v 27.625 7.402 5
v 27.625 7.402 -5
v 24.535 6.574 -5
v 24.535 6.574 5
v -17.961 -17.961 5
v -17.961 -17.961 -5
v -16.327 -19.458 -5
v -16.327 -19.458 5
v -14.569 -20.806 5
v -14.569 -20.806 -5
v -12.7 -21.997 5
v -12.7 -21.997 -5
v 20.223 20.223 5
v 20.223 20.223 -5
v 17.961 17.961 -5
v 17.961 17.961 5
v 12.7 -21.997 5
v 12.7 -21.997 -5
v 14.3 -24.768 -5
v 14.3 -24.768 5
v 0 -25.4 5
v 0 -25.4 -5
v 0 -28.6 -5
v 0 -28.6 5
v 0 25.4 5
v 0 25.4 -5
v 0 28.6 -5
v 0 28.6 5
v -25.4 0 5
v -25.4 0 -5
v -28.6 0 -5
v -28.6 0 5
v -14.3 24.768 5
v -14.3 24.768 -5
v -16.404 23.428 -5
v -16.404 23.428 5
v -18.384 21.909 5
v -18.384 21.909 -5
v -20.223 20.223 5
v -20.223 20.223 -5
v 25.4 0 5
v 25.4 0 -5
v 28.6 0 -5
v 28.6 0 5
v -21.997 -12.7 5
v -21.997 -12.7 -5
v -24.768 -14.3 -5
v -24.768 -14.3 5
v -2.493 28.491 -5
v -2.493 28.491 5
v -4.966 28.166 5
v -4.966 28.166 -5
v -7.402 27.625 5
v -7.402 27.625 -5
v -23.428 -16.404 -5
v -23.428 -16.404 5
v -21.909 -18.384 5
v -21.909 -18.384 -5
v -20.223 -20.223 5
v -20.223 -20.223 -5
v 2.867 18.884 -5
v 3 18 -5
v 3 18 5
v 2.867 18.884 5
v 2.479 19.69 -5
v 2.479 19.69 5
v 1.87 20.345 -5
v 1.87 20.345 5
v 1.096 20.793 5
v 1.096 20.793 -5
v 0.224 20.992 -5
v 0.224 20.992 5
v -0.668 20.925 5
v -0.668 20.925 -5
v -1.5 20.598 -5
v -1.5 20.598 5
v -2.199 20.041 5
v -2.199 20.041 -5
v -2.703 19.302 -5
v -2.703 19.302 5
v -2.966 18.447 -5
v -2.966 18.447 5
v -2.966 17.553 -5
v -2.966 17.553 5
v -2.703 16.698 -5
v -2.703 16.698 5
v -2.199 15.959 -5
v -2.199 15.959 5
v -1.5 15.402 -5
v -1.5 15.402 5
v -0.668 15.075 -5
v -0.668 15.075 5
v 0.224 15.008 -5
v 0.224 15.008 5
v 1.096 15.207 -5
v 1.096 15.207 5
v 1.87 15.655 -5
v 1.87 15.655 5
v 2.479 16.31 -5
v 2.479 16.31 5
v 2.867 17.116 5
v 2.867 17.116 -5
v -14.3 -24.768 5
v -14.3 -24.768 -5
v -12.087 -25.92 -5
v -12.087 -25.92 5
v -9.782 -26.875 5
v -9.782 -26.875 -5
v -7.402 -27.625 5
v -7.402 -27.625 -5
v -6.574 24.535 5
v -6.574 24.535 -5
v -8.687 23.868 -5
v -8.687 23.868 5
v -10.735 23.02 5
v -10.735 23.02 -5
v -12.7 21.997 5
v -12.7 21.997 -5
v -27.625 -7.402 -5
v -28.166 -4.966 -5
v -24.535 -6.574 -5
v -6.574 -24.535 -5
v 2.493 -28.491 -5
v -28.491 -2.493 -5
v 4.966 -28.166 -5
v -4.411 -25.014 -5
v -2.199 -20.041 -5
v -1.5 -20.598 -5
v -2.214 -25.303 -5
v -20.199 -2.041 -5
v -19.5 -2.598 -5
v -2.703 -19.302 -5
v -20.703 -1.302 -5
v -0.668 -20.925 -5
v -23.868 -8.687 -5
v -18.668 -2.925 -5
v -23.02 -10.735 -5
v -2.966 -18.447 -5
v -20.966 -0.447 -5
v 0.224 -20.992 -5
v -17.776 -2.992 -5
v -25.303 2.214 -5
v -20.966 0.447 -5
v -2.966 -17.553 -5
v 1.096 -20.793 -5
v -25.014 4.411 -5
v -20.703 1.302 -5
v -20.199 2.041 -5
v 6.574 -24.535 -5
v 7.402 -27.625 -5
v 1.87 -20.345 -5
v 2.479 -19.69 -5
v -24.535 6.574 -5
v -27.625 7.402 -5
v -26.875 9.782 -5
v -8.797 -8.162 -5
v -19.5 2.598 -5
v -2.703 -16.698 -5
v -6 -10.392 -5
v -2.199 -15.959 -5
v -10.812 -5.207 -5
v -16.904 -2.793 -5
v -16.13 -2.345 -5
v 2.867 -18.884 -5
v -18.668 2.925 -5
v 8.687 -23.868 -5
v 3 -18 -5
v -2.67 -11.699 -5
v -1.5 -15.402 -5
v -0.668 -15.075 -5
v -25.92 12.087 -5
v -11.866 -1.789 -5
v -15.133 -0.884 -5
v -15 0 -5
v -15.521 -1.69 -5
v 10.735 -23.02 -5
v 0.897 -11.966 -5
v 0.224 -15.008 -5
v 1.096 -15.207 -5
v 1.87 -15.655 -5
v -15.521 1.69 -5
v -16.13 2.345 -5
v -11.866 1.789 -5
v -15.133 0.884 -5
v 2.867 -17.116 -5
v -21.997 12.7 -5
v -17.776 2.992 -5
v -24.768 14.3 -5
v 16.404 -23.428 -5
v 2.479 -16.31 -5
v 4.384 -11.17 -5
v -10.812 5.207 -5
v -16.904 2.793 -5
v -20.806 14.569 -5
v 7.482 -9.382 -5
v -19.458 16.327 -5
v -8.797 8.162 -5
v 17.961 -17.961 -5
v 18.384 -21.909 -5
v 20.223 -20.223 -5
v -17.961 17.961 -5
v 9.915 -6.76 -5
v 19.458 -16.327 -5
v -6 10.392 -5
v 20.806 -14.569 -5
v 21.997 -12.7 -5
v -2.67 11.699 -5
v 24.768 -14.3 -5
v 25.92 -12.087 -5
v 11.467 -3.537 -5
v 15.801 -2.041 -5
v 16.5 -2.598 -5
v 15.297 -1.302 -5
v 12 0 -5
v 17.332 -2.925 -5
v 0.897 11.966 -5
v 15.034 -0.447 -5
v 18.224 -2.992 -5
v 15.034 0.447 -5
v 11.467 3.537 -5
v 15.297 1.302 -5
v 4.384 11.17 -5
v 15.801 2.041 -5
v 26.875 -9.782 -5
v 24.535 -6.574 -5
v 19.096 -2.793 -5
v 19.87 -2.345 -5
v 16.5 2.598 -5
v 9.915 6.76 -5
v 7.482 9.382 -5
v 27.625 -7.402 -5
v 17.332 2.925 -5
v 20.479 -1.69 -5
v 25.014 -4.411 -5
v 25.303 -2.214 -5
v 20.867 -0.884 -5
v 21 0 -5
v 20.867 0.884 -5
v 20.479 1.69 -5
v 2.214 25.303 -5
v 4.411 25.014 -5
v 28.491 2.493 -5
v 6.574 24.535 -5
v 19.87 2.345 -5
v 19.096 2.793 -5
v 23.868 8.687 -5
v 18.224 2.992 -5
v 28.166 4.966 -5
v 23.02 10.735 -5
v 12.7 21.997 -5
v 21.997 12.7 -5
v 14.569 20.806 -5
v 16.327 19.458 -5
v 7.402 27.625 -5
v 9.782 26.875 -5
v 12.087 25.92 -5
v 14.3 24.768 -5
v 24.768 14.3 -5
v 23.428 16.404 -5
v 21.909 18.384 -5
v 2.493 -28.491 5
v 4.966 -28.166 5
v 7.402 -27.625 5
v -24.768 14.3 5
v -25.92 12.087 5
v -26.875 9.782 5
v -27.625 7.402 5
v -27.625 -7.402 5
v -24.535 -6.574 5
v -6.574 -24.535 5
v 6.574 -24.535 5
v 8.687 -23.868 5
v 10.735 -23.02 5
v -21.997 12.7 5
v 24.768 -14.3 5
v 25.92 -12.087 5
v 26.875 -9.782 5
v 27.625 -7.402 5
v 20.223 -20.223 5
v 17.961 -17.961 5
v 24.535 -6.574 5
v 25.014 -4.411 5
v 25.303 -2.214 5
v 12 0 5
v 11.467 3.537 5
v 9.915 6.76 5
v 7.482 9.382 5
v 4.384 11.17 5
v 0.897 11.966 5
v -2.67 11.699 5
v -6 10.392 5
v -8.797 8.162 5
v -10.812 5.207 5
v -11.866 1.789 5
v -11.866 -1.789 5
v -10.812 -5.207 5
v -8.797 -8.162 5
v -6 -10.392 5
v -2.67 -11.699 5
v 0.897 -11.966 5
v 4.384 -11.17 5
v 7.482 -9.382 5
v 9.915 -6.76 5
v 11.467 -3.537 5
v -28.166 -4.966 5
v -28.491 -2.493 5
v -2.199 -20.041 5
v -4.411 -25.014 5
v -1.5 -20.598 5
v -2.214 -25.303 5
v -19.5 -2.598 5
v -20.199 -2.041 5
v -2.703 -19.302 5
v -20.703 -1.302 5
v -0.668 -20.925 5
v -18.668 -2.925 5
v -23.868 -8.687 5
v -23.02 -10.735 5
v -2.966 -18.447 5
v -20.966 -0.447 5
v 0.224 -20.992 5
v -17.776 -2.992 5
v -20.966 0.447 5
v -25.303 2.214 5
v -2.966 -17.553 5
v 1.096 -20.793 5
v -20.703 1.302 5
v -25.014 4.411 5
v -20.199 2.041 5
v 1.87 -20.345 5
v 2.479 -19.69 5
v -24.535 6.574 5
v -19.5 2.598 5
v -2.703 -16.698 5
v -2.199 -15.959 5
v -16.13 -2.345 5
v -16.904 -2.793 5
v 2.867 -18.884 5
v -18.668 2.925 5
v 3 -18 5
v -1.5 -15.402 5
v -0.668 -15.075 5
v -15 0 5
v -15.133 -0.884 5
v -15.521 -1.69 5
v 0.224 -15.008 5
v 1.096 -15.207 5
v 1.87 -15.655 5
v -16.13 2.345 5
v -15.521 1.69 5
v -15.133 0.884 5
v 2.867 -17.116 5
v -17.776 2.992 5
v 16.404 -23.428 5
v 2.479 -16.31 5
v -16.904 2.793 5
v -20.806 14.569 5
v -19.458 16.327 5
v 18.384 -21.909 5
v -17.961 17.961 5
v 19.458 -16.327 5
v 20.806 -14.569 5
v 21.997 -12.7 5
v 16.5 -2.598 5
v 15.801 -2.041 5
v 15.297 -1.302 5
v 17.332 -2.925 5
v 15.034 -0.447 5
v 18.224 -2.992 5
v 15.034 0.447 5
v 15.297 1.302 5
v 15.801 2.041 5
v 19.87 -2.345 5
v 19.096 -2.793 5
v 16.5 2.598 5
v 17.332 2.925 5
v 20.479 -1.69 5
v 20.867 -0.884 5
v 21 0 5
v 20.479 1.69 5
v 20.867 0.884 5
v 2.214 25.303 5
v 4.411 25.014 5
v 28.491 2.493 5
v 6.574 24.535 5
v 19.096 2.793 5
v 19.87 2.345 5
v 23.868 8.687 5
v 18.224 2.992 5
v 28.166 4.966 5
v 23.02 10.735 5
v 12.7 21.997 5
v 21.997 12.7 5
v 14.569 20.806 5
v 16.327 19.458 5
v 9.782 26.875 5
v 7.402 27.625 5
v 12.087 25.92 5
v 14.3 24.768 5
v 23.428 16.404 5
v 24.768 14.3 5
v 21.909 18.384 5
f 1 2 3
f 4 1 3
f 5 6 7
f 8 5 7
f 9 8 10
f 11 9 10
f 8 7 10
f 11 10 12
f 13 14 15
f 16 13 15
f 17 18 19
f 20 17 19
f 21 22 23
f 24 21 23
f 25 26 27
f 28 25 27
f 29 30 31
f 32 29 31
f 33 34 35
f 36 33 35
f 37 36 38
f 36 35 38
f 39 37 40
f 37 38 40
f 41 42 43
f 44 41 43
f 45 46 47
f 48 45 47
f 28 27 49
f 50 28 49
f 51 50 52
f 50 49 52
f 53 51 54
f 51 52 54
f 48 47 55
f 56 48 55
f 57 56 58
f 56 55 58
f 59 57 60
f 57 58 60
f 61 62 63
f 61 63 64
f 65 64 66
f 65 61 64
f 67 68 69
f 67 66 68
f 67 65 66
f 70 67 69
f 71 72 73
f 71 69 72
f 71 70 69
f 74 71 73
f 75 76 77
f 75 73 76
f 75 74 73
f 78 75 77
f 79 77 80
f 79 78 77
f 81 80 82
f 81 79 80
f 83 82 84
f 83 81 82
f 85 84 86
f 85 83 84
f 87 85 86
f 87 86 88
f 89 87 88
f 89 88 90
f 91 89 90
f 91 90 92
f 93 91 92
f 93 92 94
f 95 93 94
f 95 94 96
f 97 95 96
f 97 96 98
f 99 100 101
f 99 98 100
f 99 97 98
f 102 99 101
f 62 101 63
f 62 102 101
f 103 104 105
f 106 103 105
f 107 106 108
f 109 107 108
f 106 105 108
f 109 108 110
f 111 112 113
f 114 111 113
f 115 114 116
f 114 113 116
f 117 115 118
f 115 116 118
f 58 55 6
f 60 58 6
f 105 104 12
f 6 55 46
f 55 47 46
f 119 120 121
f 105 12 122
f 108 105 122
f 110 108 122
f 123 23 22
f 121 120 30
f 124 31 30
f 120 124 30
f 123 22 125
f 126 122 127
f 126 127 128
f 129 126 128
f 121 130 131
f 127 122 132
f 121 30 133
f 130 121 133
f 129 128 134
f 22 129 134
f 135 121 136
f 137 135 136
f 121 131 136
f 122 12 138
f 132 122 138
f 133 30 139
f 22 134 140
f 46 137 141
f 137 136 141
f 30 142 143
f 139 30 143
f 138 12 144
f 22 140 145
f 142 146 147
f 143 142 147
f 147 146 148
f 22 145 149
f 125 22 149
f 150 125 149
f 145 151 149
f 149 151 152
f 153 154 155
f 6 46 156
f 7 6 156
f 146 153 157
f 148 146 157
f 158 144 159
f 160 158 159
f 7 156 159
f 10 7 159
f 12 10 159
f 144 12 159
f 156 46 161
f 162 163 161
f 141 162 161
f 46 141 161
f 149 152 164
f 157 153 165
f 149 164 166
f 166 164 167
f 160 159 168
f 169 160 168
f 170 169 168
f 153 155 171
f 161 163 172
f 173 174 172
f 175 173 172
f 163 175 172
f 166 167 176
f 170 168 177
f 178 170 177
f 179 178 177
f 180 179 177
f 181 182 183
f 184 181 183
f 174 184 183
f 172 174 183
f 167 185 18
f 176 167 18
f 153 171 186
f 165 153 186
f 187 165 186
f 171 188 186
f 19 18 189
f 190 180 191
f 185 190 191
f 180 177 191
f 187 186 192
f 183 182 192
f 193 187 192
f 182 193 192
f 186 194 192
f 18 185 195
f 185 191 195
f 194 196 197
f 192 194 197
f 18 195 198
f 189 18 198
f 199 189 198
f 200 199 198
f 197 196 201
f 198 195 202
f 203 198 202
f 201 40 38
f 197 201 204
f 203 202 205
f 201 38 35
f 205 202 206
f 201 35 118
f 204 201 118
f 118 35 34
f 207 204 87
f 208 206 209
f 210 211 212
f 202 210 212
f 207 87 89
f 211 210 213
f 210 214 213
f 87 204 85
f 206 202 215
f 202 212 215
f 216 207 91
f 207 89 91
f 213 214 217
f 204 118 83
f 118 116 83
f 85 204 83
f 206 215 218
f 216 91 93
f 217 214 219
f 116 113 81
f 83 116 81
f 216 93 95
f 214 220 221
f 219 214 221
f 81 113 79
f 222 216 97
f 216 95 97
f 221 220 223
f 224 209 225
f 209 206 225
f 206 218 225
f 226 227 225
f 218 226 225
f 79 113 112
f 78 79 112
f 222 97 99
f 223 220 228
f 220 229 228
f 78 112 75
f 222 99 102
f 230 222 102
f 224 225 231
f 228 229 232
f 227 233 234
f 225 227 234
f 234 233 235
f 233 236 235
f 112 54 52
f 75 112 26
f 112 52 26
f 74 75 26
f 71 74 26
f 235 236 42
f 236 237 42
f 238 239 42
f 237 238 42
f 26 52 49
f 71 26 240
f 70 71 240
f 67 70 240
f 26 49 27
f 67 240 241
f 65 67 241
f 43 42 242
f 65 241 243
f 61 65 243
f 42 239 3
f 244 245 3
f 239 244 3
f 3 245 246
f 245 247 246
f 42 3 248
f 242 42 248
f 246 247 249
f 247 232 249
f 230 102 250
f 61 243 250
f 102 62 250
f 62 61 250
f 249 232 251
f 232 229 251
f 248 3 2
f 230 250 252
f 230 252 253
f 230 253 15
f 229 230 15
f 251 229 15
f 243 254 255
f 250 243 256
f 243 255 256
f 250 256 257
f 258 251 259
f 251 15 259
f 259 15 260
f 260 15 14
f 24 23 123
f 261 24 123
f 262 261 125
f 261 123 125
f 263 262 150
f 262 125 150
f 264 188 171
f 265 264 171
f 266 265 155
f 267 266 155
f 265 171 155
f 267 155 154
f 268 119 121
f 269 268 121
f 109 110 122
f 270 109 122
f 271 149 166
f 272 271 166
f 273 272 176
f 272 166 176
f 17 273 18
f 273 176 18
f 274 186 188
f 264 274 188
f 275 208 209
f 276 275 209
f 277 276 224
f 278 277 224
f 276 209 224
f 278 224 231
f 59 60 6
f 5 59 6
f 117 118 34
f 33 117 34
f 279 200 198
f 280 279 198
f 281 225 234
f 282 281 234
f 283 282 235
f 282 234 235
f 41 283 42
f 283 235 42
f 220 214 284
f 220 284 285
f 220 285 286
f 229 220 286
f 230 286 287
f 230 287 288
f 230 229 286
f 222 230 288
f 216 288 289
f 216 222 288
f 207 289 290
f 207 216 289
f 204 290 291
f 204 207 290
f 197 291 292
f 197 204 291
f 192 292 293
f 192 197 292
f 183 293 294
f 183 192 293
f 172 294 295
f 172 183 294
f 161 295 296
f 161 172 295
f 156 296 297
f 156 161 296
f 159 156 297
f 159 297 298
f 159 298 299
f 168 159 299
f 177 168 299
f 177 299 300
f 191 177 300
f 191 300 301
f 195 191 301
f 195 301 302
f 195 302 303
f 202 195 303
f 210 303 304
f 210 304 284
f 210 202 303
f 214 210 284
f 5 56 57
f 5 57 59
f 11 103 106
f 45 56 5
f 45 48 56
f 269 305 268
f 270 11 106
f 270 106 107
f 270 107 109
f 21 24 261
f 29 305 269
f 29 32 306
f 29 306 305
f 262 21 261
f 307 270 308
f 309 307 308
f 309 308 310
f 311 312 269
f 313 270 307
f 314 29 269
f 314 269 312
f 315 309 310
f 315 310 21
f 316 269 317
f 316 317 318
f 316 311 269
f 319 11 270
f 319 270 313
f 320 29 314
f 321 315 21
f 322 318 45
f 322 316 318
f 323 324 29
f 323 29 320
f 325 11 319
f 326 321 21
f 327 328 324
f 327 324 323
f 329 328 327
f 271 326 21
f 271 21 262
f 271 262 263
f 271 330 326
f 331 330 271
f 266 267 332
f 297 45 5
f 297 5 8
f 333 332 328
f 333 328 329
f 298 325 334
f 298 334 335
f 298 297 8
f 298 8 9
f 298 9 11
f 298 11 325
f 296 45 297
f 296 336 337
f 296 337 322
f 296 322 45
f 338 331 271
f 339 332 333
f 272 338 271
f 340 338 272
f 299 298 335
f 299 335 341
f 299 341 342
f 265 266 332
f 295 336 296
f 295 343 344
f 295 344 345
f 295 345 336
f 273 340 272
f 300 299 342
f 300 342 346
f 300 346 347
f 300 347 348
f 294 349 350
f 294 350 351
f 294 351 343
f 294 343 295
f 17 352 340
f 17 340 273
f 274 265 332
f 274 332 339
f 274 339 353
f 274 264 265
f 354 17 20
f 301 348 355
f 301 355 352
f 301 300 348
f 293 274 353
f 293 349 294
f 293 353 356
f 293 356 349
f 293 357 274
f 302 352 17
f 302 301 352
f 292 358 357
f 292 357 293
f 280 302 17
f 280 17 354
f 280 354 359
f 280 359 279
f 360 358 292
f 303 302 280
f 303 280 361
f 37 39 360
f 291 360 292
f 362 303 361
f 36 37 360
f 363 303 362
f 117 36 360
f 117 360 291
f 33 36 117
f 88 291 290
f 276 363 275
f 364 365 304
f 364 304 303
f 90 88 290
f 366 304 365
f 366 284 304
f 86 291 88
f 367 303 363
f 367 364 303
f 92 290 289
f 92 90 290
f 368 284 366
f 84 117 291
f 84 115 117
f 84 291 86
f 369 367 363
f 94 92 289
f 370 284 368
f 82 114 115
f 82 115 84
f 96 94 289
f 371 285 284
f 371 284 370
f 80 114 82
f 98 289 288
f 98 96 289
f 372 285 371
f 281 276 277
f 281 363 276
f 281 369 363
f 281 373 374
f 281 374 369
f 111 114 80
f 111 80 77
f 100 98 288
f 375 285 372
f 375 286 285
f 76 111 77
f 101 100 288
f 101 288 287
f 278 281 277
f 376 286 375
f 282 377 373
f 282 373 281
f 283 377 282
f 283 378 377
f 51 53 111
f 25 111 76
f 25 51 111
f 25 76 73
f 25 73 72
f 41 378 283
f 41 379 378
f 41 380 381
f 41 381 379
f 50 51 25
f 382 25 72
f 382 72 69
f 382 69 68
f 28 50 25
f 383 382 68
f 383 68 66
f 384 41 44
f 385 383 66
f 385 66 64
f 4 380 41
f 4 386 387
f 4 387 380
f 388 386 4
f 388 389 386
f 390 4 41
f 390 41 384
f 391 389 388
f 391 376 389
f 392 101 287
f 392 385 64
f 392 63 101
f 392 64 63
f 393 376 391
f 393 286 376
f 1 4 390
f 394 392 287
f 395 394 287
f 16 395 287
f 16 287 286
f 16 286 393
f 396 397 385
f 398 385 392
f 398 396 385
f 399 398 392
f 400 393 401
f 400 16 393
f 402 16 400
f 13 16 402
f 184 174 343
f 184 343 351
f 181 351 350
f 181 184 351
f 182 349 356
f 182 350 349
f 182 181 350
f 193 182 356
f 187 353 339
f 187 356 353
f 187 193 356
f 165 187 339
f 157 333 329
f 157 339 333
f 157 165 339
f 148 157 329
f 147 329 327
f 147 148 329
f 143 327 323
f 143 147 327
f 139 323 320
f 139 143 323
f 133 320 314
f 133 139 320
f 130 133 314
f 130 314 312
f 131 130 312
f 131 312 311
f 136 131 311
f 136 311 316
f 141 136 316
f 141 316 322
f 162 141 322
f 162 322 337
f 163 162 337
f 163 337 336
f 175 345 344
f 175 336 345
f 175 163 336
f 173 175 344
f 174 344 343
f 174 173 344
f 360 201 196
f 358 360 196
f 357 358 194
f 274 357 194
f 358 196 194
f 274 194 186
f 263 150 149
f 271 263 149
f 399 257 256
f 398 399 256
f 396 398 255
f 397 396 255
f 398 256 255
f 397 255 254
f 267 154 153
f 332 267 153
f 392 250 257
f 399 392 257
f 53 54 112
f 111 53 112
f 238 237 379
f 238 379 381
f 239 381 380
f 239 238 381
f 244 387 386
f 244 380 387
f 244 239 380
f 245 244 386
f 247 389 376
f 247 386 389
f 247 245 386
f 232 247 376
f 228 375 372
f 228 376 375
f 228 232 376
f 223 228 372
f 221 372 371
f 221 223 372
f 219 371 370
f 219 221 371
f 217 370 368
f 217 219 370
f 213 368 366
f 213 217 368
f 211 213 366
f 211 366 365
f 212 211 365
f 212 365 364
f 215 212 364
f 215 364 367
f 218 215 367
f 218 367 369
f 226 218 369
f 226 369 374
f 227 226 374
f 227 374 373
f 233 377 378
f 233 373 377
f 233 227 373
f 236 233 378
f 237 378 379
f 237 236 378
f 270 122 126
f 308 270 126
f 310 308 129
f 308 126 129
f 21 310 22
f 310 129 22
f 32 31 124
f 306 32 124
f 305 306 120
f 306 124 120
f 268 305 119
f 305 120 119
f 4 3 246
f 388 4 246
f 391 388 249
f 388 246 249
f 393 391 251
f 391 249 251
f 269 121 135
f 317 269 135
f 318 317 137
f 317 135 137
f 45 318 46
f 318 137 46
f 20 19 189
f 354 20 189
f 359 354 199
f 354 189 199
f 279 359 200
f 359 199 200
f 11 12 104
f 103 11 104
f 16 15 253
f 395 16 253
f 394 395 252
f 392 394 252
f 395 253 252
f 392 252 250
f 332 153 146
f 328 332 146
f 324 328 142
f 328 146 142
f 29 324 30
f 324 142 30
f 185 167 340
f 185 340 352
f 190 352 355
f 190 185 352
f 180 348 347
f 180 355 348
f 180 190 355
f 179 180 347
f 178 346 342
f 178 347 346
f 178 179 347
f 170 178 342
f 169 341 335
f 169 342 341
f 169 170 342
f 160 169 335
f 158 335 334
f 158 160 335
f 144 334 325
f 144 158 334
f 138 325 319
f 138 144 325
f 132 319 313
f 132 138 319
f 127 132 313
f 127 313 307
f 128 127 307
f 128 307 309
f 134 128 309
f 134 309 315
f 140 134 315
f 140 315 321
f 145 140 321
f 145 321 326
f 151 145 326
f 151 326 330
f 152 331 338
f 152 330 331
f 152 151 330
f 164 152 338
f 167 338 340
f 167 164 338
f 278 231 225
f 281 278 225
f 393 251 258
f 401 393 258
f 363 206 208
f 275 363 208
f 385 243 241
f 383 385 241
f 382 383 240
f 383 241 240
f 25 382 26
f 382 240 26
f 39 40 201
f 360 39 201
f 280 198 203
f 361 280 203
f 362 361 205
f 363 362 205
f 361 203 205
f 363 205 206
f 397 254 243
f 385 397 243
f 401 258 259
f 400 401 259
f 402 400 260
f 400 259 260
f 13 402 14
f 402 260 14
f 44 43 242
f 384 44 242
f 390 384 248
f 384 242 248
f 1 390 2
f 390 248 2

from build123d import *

# Parameters (mm, degrees)
EXTRUDE_1_DEPTH          = 5
EXTRUDE_1_DEPTH_BACK     = 5
SKETCH_1_R               = 12
CUT_EXTRUDE_1_DEPTH      = 10
CUT_EXTRUDE_1_DEPTH_BACK = 10
SKETCH_2_R               = 3


with BuildPart() as part:
    # 草图1 → 凸台-拉伸1 (new, two sides: drawn at the far end of the back side and taken through both)
    with BuildSketch(Plane.XY.offset(-EXTRUDE_1_DEPTH_BACK)):
        with BuildLine():
            Line((21.997045256, -12.7), (24.768326548, -14.3))
            ThreePointArc((24.768326548, -14.3), (26.42295463, -10.944746166), (27.625478632, -7.40222469))
            Line((27.625478632, -7.40222469), (24.534515988, -6.574003746))
            ThreePointArc((24.534515988, -6.574003746), (25.182699479, -3.315365282), (25.4, 0))
            Line((25.4, 0), (28.6, 0))
            ThreePointArc((28.6, 0), (28.355323035, 3.733049097), (27.625478632, 7.40222469))
            Line((27.625478632, 7.40222469), (24.534515988, 6.574003746))
            ThreePointArc((24.534515988, 6.574003746), (23.466540126, 9.720159182), (21.997045256, 12.7))
            Line((21.997045256, 12.7), (24.768326548, 14.3))
            ThreePointArc((24.768326548, 14.3), (22.689905532, 17.41057687), (20.223253942, 20.223253942))
            Line((20.223253942, 20.223253942), (17.960512242, 17.960512242))
            ThreePointArc((17.960512242, 17.960512242), (15.462540297, 20.151174843), (12.7, 21.997045256))
            Line((12.7, 21.997045256), (14.3, 24.768326548))
            ThreePointArc((14.3, 24.768326548), (10.944746166, 26.42295463), (7.40222469, 27.625478632))
            Line((7.40222469, 27.625478632), (6.574003746, 24.534515988))
            ThreePointArc((6.574003746, 24.534515988), (3.315365282, 25.182699479), (0, 25.4))
            Line((0, 25.4), (0, 28.6))
            ThreePointArc((0, 28.6), (-3.733049097, 28.355323035), (-7.40222469, 27.625478632))
            Line((-7.40222469, 27.625478632), (-6.574003746, 24.534515988))
            ThreePointArc((-6.574003746, 24.534515988), (-9.720159182, 23.466540126), (-12.7, 21.997045256))
            Line((-12.7, 21.997045256), (-14.3, 24.768326548))
            ThreePointArc((-14.3, 24.768326548), (-17.41057687, 22.689905532), (-20.223253942, 20.223253942))
            Line((-20.223253942, 20.223253942), (-17.960512242, 17.960512242))
            ThreePointArc((-17.960512242, 17.960512242), (-20.151174843, 15.462540297), (-21.997045256, 12.7))
            Line((-21.997045256, 12.7), (-24.768326548, 14.3))
            ThreePointArc((-24.768326548, 14.3), (-26.42295463, 10.944746166), (-27.625478632, 7.40222469))
            Line((-27.625478632, 7.40222469), (-24.534515988, 6.574003746))
            ThreePointArc((-24.534515988, 6.574003746), (-25.182699479, 3.315365282), (-25.4, 0))
            Line((-25.4, 0), (-28.6, 0))
            ThreePointArc((-28.6, 0), (-28.355323035, -3.733049097), (-27.625478632, -7.40222469))
            Line((-27.625478632, -7.40222469), (-24.534515988, -6.574003746))
            ThreePointArc((-24.534515988, -6.574003746), (-23.466540126, -9.720159182), (-21.997045256, -12.7))
            Line((-21.997045256, -12.7), (-24.768326548, -14.3))
            ThreePointArc((-24.768326548, -14.3), (-22.689905532, -17.41057687), (-20.223253942, -20.223253942))
            Line((-20.223253942, -20.223253942), (-17.960512242, -17.960512242))
            ThreePointArc((-17.960512242, -17.960512242), (-15.462540297, -20.151174843), (-12.7, -21.997045256))
            Line((-12.7, -21.997045256), (-14.3, -24.768326548))
            ThreePointArc((-14.3, -24.768326548), (-10.944746166, -26.42295463), (-7.40222469, -27.625478632))
            Line((-7.40222469, -27.625478632), (-6.574003746, -24.534515988))
            ThreePointArc((-6.574003746, -24.534515988), (-3.315365282, -25.182699479), (0, -25.4))
            Line((0, -25.4), (0, -28.6))
            ThreePointArc((0, -28.6), (3.733049097, -28.355323035), (7.40222469, -27.625478632))
            Line((7.40222469, -27.625478632), (6.574003746, -24.534515988))
            ThreePointArc((6.574003746, -24.534515988), (9.720159182, -23.466540126), (12.7, -21.997045256))
            Line((12.7, -21.997045256), (14.3, -24.768326548))
            ThreePointArc((14.3, -24.768326548), (17.41057687, -22.689905532), (20.223253942, -20.223253942))
            Line((20.223253942, -20.223253942), (17.960512242, -17.960512242))
            ThreePointArc((17.960512242, -17.960512242), (20.151174843, -15.462540297), (21.997045256, -12.7))
        make_face()
        Circle(SKETCH_1_R, mode=Mode.SUBTRACT)
    extrude(amount=EXTRUDE_1_DEPTH + EXTRUDE_1_DEPTH_BACK)

    # 草图2 → 切除-拉伸1 (cut, two sides: drawn at the far end of the back side and taken through both)
    with BuildSketch(Plane.XY.offset(-CUT_EXTRUDE_1_DEPTH_BACK)):
        with Locations((18, 0)):
            Circle(SKETCH_2_R)
        with Locations((0, -18)):
            Circle(SKETCH_2_R)
        with Locations((-18, 0)):
            Circle(SKETCH_2_R)
        with Locations((0, 18)):
            Circle(SKETCH_2_R)
    extrude(amount=CUT_EXTRUDE_1_DEPTH + CUT_EXTRUDE_1_DEPTH_BACK, mode=Mode.SUBTRACT)


solid = part.part
